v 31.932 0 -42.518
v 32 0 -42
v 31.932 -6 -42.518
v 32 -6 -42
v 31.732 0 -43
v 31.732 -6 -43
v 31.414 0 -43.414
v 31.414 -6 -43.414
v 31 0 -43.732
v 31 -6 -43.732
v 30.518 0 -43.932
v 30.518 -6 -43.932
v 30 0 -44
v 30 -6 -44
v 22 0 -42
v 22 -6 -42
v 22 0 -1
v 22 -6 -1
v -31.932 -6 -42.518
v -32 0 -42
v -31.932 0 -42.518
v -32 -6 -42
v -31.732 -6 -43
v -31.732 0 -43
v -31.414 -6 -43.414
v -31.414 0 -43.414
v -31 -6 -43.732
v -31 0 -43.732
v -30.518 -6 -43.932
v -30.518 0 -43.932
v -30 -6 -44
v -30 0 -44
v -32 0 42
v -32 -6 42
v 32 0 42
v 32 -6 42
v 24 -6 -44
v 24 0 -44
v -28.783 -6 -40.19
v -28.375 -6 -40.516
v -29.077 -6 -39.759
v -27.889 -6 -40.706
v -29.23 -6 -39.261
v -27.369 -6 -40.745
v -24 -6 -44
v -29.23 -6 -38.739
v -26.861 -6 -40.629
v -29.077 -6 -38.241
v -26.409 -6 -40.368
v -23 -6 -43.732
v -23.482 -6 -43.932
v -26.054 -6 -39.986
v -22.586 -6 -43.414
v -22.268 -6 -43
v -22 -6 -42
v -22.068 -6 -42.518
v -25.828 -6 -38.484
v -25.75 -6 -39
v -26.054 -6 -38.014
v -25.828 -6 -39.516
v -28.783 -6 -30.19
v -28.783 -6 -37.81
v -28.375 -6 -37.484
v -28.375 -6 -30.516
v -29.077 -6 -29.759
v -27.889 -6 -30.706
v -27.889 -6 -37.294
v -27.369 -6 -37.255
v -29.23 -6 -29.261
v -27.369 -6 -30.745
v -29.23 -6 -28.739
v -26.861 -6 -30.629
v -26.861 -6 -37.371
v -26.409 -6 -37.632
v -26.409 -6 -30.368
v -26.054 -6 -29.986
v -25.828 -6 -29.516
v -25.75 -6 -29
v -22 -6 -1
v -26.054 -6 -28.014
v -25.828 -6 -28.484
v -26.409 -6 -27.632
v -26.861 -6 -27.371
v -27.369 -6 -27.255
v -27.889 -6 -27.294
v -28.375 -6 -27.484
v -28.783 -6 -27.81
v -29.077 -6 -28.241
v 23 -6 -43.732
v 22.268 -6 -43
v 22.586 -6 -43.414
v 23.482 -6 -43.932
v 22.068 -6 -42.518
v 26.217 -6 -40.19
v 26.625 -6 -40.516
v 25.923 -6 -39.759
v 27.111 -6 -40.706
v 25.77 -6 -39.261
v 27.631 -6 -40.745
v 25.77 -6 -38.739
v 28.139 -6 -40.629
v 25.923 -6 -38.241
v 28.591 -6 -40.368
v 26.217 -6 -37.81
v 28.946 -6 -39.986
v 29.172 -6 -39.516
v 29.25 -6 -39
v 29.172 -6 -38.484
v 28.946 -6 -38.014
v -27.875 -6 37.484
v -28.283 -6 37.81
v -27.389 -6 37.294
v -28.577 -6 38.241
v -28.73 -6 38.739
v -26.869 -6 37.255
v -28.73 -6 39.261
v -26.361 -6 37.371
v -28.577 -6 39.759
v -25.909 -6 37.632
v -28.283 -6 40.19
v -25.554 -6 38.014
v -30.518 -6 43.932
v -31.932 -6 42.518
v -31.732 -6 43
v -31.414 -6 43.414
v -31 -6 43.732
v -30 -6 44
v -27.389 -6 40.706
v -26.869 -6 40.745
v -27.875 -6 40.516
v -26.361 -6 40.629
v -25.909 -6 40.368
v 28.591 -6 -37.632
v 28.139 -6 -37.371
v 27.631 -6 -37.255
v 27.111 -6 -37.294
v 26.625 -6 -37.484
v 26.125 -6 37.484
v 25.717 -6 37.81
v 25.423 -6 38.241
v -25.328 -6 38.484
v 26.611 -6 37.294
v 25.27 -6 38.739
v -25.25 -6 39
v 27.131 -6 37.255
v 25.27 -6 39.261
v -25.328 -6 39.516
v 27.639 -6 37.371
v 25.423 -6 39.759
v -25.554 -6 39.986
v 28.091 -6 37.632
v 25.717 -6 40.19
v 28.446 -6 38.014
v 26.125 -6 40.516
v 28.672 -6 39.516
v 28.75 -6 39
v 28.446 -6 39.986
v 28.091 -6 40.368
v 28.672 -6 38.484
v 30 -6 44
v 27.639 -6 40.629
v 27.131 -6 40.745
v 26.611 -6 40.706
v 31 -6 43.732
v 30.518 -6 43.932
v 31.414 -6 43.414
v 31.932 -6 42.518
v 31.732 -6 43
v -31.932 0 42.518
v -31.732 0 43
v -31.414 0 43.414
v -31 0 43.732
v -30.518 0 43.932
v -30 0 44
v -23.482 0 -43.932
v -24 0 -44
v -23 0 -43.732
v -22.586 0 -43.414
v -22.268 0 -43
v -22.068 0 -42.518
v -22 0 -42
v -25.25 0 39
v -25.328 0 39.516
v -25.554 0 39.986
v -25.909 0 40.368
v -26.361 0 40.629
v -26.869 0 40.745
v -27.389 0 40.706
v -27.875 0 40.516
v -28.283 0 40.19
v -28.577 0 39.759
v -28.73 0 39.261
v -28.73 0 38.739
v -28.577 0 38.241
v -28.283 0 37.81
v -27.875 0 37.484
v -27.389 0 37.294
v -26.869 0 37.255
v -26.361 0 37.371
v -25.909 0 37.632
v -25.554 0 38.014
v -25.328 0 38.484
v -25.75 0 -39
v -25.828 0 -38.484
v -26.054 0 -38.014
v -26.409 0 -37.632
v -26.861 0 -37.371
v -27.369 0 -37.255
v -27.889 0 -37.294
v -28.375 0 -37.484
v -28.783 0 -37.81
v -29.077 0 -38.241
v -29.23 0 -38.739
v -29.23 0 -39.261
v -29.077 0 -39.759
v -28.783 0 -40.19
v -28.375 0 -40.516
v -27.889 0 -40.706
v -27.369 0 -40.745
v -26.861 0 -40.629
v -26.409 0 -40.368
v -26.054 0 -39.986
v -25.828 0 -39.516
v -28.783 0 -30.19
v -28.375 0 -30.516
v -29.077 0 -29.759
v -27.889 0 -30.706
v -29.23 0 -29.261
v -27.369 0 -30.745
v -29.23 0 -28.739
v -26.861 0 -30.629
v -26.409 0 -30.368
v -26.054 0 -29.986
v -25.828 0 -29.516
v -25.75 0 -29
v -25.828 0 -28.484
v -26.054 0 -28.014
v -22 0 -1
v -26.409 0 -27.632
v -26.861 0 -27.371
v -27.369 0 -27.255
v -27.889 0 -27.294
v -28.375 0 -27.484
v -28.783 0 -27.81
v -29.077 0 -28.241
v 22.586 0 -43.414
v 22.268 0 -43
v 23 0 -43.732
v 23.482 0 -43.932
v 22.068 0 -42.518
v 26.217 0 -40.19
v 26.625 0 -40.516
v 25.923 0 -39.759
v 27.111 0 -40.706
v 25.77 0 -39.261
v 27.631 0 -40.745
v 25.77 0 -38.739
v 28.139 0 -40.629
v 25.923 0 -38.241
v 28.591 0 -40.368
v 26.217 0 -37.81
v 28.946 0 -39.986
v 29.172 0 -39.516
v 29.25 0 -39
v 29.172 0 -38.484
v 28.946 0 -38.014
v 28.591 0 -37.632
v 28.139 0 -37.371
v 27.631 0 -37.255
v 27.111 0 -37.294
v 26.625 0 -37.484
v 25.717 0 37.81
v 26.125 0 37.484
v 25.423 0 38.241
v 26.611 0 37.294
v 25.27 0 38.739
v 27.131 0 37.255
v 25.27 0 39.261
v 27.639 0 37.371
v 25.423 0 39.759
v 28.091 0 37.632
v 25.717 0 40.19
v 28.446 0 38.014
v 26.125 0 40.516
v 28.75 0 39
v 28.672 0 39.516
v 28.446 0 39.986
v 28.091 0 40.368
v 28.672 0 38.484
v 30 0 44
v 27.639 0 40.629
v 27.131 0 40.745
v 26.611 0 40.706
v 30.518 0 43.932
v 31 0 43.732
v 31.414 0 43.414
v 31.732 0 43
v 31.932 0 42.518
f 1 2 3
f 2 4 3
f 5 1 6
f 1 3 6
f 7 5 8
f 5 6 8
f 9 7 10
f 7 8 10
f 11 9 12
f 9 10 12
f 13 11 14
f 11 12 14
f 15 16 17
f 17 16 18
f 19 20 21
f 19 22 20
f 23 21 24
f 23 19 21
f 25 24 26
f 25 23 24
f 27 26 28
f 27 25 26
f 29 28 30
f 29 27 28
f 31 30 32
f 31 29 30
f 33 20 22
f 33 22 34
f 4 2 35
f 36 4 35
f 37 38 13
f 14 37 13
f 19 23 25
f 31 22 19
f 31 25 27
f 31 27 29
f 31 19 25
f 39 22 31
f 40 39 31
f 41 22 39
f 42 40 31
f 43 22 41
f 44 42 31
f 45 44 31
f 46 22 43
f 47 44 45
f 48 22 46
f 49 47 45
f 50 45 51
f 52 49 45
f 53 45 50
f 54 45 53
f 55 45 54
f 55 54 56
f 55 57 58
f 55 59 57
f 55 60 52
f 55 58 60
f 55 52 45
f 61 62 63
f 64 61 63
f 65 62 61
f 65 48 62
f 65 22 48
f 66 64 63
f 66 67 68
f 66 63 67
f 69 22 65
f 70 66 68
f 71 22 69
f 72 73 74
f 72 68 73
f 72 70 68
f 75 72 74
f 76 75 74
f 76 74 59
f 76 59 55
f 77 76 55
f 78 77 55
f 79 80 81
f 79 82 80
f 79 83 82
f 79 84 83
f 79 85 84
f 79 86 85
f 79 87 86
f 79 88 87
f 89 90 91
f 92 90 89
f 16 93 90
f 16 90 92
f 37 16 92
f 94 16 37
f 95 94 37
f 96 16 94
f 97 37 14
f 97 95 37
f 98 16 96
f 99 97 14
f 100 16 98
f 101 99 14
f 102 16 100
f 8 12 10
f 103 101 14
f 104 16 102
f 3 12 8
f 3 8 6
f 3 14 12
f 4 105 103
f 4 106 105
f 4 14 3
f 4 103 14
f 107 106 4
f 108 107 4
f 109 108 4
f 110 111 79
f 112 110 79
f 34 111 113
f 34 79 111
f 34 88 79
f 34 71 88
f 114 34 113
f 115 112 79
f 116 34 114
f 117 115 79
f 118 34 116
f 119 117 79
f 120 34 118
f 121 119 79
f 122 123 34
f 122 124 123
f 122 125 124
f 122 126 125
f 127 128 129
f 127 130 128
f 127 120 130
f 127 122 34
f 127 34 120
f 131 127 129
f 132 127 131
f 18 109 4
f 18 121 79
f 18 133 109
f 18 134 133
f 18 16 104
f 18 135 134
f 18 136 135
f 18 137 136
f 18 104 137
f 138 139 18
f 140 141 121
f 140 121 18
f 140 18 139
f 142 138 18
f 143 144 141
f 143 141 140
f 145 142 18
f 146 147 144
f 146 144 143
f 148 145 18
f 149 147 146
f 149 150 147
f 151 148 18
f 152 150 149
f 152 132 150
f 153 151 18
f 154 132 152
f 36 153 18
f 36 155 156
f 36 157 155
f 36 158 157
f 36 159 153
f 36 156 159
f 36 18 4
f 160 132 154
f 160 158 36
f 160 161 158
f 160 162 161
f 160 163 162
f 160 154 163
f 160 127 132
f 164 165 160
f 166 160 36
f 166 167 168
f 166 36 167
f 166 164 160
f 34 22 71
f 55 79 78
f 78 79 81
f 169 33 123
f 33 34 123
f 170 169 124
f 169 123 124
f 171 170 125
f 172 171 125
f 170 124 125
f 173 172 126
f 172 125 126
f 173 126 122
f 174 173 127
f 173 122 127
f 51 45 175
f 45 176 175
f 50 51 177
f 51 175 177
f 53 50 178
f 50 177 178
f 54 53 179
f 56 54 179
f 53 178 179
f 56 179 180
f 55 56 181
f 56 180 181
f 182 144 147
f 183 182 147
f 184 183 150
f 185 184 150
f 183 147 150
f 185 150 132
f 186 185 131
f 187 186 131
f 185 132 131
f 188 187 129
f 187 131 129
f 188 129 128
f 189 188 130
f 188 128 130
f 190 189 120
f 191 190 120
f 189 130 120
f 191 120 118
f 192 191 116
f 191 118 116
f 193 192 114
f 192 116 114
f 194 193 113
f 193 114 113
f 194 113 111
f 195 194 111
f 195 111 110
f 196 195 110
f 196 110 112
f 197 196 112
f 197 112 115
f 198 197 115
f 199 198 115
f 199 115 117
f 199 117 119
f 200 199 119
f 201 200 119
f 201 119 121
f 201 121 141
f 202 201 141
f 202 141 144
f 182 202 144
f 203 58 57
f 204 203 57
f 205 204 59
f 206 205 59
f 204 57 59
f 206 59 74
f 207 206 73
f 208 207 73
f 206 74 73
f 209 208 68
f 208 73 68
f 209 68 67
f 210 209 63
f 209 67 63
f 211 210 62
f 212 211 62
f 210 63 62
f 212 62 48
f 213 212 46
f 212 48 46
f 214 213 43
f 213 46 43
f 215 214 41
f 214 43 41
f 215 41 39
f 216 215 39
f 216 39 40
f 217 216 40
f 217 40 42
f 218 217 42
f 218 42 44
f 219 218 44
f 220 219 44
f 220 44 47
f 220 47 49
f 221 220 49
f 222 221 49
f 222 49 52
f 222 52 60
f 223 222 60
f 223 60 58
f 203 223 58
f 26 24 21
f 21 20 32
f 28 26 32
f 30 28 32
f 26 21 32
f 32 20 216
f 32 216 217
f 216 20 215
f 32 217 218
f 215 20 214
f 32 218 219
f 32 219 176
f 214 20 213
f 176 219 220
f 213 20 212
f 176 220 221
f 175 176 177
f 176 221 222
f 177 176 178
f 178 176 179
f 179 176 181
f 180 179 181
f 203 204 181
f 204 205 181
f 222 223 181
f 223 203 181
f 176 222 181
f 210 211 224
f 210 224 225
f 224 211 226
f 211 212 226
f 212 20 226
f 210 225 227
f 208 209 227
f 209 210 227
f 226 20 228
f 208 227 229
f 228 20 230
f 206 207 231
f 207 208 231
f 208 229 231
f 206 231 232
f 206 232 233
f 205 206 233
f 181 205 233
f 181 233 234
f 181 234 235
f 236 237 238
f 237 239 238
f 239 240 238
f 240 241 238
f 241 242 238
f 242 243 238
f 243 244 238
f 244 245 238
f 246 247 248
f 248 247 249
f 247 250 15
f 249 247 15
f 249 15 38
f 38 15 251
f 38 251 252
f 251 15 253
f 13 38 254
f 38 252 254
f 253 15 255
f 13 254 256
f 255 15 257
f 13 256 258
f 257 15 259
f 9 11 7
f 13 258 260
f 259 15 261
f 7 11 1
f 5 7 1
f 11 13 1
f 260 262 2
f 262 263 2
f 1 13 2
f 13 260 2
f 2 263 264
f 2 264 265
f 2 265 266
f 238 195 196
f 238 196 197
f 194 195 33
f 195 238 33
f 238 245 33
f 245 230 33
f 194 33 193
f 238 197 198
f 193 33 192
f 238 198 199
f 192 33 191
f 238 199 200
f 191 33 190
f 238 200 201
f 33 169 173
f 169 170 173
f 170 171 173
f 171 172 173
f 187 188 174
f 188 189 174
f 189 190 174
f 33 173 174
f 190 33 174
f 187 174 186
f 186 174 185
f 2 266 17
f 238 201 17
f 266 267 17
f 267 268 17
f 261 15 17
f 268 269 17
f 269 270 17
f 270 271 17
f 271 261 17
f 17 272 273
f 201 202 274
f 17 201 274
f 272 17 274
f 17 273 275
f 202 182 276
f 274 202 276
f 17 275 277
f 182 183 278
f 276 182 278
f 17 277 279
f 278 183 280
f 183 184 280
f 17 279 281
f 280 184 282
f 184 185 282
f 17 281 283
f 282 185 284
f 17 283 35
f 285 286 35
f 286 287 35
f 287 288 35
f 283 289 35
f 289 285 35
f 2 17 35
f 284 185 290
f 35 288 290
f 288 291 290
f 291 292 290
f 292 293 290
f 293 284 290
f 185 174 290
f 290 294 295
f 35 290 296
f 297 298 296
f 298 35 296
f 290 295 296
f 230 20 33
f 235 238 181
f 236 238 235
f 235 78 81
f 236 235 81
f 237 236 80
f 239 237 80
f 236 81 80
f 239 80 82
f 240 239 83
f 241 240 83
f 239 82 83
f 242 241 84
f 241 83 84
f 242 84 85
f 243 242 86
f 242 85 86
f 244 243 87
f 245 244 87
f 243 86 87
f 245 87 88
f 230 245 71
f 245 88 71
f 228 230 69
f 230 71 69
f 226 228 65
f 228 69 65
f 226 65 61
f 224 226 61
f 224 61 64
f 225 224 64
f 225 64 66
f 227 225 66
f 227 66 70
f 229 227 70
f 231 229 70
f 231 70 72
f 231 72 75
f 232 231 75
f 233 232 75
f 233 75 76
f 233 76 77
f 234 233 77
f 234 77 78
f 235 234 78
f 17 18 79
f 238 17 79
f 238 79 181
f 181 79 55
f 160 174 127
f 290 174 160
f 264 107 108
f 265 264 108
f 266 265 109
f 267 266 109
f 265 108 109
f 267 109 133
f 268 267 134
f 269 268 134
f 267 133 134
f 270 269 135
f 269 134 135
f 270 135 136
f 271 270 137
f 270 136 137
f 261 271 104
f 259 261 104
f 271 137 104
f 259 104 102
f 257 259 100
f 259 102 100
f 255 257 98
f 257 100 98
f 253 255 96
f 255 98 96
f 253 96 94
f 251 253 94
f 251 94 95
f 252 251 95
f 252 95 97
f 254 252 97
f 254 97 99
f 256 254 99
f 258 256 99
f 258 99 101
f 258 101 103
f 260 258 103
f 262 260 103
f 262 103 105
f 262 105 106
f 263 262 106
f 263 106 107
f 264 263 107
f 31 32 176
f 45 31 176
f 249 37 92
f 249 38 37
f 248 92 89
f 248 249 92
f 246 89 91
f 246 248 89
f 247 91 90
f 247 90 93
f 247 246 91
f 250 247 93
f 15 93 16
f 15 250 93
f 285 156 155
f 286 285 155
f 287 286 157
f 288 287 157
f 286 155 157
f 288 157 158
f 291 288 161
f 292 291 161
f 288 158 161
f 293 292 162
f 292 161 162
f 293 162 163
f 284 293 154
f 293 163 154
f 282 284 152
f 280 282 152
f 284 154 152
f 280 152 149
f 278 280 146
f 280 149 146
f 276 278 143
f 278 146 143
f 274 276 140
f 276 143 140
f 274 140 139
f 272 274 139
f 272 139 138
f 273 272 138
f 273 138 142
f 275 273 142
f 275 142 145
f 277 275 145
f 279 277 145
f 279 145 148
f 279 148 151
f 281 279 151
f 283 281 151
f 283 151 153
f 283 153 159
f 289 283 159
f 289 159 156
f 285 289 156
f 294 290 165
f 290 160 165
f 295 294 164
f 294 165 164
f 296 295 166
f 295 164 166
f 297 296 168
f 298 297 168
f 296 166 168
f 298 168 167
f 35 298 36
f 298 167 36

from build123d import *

# Parameters (mm, degrees)
F0_W     = 64
F0_H     = 88
F1_DEPTH = 6
F2_R     = 1.75
F3_DEPTH = 25
F4_R     = 2


# Not quite as in the source:
# - a feature names something its author has since deleted; it is built from what else it names


with BuildPart() as f1:
    # F0 (on Front) → F1 (new body)
    with BuildSketch(Plane.XZ):
        Rectangle(F0_W, F0_H)
    extrude(amount=F1_DEPTH)

    # F2 (on face) → F3 (cut)
    with BuildSketch(Plane.XZ.offset(6)):
        Polygon((22, -1), (0, -1), (-22, -1), (-22, -44), (22, -44), align=None)
        with Locations((27.5, -39)):
            Circle(F2_R)
        with Locations((-27.5, -29)):
            Circle(F2_R)
        with Locations((-27.5, -39)):
            Circle(F2_R)
        with Locations((-27, 39)):
            Circle(F2_R)
        with Locations((27, 39)):
            Circle(F2_R)
    extrude(amount=-F3_DEPTH, mode=Mode.SUBTRACT)

    # F4
    f4_edges = [f1.edges().sort_by_distance(p)[0] for p in [
        (-32, -3, 44),
        (32, -3, 44),
        (-32, -3, -44),
        (32, -3, -44),
        (-22, -3, -44),
        (22, -3, -44),
    ]]
    fillet(f4_edges, radius=F4_R)


solid = f1.part
